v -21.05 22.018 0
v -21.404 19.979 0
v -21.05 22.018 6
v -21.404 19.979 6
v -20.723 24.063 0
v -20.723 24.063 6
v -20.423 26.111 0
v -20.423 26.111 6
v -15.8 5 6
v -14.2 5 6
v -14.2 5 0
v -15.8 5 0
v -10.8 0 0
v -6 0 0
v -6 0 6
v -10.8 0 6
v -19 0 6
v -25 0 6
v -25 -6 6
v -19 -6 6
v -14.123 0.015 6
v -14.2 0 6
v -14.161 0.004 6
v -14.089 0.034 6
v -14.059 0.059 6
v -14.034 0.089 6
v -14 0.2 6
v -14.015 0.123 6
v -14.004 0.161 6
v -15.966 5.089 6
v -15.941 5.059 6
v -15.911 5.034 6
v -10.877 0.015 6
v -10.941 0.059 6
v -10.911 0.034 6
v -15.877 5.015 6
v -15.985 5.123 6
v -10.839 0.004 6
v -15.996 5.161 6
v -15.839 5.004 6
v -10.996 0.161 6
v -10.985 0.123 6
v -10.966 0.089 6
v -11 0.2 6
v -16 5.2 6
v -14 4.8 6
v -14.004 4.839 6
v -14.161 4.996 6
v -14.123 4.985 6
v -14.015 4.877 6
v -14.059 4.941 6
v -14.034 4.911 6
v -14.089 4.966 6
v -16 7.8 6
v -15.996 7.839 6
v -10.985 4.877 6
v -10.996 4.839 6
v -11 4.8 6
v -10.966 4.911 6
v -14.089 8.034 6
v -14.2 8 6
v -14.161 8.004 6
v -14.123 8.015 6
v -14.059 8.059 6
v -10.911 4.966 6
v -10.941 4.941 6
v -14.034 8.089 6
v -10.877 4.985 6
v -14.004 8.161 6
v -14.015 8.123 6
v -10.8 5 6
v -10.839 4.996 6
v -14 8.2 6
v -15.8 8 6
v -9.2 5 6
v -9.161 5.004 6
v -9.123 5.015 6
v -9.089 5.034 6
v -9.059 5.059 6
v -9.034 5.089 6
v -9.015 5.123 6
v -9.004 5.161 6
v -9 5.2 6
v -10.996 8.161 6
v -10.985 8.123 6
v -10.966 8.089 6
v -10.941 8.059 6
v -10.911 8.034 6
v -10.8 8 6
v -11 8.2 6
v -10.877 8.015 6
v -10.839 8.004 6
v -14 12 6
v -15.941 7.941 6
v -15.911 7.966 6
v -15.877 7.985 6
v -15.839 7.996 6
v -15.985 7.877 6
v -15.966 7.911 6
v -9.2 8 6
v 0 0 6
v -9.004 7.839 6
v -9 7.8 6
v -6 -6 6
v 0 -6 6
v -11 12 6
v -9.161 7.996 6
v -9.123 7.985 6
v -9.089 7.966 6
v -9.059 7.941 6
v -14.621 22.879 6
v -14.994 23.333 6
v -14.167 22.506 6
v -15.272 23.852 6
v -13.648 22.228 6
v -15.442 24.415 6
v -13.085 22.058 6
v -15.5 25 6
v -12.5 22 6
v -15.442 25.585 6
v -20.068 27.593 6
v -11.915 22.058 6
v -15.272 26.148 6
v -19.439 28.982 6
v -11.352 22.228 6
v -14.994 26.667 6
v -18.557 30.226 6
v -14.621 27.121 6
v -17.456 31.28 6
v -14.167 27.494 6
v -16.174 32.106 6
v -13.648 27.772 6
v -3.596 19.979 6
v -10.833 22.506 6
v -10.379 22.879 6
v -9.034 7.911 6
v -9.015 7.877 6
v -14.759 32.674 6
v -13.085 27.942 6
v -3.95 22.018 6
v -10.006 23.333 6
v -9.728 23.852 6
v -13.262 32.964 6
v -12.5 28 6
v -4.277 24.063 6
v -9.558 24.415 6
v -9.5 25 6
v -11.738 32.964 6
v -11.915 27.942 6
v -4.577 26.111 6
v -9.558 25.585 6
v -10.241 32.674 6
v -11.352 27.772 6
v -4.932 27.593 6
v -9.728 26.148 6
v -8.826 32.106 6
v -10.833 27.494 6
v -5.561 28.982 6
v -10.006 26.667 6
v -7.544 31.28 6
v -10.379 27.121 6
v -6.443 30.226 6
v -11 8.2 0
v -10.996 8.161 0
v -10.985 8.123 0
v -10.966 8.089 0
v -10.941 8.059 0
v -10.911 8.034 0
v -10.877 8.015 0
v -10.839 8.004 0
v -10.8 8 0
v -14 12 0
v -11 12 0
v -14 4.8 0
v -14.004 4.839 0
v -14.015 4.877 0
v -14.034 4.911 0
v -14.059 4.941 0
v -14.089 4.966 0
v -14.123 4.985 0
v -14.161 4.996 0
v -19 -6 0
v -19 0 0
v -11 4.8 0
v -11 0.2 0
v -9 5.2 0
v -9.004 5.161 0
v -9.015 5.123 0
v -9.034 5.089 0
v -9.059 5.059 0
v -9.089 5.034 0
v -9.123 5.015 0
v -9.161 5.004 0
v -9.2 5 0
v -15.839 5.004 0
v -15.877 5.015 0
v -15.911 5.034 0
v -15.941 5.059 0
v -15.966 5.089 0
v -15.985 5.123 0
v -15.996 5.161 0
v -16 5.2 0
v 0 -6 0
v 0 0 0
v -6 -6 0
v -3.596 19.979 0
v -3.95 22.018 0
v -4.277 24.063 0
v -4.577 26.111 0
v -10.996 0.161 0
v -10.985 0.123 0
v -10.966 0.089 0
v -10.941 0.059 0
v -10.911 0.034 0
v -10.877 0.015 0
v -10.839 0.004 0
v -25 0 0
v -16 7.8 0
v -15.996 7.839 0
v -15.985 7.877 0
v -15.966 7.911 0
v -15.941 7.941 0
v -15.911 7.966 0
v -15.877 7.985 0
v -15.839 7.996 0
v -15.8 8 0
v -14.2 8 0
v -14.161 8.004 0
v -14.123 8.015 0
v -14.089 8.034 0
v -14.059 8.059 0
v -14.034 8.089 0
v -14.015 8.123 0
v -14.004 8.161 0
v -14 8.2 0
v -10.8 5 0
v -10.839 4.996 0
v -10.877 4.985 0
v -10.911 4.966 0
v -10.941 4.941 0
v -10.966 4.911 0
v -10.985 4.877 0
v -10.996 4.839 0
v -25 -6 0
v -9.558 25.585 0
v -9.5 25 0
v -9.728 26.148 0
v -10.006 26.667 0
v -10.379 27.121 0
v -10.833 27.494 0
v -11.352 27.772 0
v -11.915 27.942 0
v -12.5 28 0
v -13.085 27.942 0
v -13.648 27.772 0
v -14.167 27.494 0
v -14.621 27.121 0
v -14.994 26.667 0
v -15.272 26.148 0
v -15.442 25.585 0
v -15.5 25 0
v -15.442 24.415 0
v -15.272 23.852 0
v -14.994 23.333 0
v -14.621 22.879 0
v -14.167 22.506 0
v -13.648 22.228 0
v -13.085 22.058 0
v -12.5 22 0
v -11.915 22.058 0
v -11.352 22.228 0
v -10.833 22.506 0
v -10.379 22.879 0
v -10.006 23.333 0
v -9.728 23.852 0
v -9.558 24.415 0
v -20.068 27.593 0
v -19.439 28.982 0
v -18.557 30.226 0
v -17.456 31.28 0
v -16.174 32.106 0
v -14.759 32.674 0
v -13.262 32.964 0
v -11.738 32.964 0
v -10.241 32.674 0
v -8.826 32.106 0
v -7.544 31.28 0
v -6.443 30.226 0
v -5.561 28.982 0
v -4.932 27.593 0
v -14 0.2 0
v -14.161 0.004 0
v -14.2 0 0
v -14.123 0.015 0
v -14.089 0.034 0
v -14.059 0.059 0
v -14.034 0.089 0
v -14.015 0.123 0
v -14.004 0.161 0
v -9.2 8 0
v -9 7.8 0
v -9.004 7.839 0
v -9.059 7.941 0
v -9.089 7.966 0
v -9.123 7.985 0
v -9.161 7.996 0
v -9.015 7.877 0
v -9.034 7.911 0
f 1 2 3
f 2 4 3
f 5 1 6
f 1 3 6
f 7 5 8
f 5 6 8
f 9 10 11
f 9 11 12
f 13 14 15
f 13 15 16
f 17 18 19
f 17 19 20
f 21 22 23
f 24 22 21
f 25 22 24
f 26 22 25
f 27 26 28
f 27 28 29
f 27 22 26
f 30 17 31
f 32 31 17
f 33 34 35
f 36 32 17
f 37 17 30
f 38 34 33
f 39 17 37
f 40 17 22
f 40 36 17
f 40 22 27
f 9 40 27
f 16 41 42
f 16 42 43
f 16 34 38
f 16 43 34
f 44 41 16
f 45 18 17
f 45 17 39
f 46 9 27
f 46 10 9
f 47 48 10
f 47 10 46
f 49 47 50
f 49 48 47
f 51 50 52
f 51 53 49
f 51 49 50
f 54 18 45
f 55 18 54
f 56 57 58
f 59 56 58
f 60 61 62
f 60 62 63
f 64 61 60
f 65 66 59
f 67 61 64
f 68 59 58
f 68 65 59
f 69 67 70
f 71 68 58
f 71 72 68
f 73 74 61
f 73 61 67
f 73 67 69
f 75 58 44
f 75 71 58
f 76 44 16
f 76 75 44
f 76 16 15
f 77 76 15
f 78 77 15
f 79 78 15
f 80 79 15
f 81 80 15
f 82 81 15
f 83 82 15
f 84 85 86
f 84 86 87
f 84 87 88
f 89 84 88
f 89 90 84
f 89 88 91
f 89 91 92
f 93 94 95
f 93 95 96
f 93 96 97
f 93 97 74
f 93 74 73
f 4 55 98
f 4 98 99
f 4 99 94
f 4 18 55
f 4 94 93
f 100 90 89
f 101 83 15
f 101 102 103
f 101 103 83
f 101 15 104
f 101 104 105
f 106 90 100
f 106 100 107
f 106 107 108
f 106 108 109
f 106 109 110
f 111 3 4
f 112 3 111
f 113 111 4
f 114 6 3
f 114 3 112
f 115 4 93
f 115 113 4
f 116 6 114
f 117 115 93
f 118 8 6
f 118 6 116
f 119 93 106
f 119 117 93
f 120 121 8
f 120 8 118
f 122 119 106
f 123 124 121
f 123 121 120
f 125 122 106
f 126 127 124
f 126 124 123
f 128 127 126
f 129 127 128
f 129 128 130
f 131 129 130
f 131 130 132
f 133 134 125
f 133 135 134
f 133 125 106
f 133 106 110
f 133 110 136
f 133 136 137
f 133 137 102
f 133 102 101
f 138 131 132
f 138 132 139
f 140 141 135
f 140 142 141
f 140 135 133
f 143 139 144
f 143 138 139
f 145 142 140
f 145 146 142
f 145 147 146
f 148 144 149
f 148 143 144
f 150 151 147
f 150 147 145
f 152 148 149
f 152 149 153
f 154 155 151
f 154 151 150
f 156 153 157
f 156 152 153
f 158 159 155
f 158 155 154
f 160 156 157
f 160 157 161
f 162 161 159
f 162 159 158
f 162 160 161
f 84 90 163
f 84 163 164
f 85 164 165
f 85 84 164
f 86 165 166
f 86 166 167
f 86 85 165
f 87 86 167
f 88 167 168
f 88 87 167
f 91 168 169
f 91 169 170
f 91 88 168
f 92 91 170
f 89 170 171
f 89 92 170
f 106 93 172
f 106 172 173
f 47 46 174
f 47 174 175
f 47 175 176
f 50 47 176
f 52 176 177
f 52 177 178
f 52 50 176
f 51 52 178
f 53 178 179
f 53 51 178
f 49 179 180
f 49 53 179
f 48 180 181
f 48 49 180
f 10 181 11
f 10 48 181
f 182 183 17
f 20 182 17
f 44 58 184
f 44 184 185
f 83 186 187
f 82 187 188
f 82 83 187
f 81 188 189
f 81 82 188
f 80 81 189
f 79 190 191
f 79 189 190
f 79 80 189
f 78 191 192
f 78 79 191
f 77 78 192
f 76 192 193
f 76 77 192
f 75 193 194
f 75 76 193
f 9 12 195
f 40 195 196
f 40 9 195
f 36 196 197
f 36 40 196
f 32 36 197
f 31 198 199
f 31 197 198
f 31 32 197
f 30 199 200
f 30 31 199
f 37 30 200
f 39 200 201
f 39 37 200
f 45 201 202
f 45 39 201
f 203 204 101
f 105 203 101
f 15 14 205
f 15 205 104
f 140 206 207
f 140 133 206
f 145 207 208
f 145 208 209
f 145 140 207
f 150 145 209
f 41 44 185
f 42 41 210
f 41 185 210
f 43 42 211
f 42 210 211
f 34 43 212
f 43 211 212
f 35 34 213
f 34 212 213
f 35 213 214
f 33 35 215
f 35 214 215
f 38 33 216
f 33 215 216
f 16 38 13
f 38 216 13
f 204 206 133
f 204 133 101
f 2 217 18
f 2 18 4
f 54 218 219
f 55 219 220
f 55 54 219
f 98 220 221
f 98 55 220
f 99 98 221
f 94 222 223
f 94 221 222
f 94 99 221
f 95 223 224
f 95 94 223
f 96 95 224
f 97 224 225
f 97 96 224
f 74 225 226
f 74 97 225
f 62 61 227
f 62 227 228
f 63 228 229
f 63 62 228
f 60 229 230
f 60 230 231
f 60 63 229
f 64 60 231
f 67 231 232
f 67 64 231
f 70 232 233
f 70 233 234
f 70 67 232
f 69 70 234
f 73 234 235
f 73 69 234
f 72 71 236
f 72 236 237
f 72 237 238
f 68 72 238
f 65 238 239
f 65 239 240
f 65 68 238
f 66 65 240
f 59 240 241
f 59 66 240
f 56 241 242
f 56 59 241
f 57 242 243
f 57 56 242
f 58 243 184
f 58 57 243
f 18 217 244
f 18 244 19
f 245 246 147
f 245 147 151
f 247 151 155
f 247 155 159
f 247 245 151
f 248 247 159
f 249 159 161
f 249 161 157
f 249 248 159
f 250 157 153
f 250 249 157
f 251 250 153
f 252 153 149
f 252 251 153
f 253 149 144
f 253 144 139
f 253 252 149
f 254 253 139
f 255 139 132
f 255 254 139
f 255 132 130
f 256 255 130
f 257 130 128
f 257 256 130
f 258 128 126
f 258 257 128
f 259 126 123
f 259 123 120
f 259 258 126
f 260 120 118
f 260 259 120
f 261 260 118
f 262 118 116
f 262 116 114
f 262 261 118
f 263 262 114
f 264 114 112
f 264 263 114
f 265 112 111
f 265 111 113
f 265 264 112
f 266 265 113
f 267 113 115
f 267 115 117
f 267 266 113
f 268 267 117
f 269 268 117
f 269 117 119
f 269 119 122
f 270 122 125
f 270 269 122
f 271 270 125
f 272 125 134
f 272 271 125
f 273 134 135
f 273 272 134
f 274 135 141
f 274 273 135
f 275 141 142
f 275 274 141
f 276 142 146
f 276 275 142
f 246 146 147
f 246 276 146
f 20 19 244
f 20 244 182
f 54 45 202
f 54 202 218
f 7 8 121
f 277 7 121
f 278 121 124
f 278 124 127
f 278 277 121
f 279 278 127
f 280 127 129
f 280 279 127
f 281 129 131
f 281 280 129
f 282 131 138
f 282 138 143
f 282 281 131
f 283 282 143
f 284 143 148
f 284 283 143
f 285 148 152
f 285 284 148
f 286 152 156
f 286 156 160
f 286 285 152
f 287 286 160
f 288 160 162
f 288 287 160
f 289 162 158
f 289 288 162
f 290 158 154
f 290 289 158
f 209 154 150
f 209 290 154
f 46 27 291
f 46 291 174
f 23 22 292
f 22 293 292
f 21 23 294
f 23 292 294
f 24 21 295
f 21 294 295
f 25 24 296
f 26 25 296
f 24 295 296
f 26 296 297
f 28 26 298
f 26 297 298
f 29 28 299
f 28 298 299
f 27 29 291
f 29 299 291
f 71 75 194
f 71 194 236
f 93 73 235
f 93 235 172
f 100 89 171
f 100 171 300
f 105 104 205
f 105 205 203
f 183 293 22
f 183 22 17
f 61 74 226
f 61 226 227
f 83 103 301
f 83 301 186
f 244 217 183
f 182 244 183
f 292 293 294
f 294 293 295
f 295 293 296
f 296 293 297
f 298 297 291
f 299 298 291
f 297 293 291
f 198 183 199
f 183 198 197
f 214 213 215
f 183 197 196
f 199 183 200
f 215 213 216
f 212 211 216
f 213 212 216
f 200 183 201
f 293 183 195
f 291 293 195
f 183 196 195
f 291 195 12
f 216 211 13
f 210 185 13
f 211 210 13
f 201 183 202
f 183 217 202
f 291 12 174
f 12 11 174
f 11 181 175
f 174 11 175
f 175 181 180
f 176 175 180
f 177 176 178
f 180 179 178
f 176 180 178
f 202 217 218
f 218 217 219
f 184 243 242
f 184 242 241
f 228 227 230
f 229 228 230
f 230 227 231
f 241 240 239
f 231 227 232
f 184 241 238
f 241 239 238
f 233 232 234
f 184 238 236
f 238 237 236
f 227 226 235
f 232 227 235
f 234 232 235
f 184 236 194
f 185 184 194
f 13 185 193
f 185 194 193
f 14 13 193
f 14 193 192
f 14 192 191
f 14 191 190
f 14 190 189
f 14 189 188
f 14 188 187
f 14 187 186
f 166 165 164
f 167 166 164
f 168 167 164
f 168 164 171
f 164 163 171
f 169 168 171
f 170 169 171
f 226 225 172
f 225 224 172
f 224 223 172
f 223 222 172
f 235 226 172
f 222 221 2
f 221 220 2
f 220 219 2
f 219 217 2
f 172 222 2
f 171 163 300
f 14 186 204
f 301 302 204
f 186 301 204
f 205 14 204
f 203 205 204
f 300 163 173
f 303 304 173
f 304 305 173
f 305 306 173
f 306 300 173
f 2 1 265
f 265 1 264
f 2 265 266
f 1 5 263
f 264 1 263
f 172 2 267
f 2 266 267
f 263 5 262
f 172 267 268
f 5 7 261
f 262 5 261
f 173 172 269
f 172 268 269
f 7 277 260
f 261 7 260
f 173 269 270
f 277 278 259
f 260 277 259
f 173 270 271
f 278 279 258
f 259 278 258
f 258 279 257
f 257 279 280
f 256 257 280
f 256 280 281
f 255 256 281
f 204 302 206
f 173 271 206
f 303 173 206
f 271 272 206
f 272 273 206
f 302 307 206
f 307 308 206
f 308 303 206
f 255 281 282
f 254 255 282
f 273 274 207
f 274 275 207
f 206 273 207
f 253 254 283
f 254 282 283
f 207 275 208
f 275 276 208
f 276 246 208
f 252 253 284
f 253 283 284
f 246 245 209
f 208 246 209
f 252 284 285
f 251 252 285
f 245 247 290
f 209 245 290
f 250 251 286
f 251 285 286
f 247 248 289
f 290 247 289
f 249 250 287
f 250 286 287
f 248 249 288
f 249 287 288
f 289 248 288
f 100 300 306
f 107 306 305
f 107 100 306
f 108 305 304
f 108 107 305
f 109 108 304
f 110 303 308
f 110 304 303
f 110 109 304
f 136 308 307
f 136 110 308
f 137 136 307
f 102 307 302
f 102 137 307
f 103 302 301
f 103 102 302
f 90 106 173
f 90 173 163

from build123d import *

# Parameters (mm, degrees)
SKETCH2_R           = 3
BOSS_EXTRUDE1_DEPTH = 6
FILLET1_R           = 160
GROOVE_DEPTH        = 42.833001327
SKETCH5_W           = 6
SKETCH5_H           = 6
FINGERS_DEPTH       = 6
FILLET2_R           = 0.2


with BuildPart() as part:
    # Sketch2 → Boss-Extrude1 (new body)
    with BuildSketch(Plane.XY):
        with BuildLine():
            Line((0, 0), (-25, 0))
            Line((-25, 0), (-20.5, 25))
            ThreePointArc((-20.5, 25), (-12.5, 33), (-4.5, 25))
            Line((-4.5, 25), (0, 0))
        make_face()
        with Locations((-12.5, 25)):
            Circle(SKETCH2_R, mode=Mode.SUBTRACT)
    extrude(amount=BOSS_EXTRUDE1_DEPTH)

    # Fillet1
    fillet1_edges = [part.edges().sort_by_distance(p)[0] for p in [
        (-20.5, 25, 3),
        (-4.5, 25, 3),
    ]]
    fillet(fillet1_edges, radius=FILLET1_R)

    # Sketch4 → Groove (cut, through all)
    with BuildSketch(Plane.XY.offset(6)):
        with BuildLine():
            Line((-14, 0), (-14, 4.8))
            ThreePointArc((-14, 4.8), (-14.058578644, 4.941421356), (-14.2, 5))
            Line((-14.2, 5), (-15.8, 5))
            ThreePointArc((-15.8, 5), (-15.941421356, 5.058578644), (-16, 5.2))
            Line((-16, 5.2), (-16, 7.8))
            ThreePointArc((-16, 7.8), (-15.941421356, 7.941421356), (-15.8, 8))
            Line((-15.8, 8), (-14.2, 8))
            ThreePointArc((-14.2, 8), (-14.058578644, 8.058578644), (-14, 8.2))
            Line((-14, 8.2), (-14, 12))
            Line((-14, 12), (-11, 12))
            Line((-11, 12), (-11, 8.2))
            ThreePointArc((-11, 8.2), (-10.941421356, 8.058578644), (-10.8, 8))
            Line((-10.8, 8), (-9.2, 8))
            ThreePointArc((-9.2, 8), (-9.058578644, 7.941421356), (-9, 7.8))
            Line((-9, 7.8), (-9, 5.2))
            ThreePointArc((-9, 5.2), (-9.058578644, 5.058578644), (-9.2, 5))
            Line((-9.2, 5), (-10.8, 5))
            ThreePointArc((-10.8, 5), (-10.941421356, 4.941421356), (-11, 4.8))
            Line((-11, 4.8), (-11, 0))
            Line((-11, 0), (-14, 0))
        make_face()
    extrude(amount=-GROOVE_DEPTH, mode=Mode.SUBTRACT)

    # Sketch5 → Fingers (add)
    with BuildSketch(Plane.XZ):
        with Locations((-22, 3)):
            Rectangle(SKETCH5_W, SKETCH5_H)
        with Locations((-3, 3)):
            Rectangle(SKETCH5_W, SKETCH5_H)
    extrude(amount=FINGERS_DEPTH)

    # Fillet2
    fillet2_edges = [part.edges().sort_by_distance(p)[0] for p in [
        (-11, 0, 3),
        (-14, 0, 3),
    ]]
    fillet(fillet2_edges, radius=FILLET2_R)


solid = part.part
